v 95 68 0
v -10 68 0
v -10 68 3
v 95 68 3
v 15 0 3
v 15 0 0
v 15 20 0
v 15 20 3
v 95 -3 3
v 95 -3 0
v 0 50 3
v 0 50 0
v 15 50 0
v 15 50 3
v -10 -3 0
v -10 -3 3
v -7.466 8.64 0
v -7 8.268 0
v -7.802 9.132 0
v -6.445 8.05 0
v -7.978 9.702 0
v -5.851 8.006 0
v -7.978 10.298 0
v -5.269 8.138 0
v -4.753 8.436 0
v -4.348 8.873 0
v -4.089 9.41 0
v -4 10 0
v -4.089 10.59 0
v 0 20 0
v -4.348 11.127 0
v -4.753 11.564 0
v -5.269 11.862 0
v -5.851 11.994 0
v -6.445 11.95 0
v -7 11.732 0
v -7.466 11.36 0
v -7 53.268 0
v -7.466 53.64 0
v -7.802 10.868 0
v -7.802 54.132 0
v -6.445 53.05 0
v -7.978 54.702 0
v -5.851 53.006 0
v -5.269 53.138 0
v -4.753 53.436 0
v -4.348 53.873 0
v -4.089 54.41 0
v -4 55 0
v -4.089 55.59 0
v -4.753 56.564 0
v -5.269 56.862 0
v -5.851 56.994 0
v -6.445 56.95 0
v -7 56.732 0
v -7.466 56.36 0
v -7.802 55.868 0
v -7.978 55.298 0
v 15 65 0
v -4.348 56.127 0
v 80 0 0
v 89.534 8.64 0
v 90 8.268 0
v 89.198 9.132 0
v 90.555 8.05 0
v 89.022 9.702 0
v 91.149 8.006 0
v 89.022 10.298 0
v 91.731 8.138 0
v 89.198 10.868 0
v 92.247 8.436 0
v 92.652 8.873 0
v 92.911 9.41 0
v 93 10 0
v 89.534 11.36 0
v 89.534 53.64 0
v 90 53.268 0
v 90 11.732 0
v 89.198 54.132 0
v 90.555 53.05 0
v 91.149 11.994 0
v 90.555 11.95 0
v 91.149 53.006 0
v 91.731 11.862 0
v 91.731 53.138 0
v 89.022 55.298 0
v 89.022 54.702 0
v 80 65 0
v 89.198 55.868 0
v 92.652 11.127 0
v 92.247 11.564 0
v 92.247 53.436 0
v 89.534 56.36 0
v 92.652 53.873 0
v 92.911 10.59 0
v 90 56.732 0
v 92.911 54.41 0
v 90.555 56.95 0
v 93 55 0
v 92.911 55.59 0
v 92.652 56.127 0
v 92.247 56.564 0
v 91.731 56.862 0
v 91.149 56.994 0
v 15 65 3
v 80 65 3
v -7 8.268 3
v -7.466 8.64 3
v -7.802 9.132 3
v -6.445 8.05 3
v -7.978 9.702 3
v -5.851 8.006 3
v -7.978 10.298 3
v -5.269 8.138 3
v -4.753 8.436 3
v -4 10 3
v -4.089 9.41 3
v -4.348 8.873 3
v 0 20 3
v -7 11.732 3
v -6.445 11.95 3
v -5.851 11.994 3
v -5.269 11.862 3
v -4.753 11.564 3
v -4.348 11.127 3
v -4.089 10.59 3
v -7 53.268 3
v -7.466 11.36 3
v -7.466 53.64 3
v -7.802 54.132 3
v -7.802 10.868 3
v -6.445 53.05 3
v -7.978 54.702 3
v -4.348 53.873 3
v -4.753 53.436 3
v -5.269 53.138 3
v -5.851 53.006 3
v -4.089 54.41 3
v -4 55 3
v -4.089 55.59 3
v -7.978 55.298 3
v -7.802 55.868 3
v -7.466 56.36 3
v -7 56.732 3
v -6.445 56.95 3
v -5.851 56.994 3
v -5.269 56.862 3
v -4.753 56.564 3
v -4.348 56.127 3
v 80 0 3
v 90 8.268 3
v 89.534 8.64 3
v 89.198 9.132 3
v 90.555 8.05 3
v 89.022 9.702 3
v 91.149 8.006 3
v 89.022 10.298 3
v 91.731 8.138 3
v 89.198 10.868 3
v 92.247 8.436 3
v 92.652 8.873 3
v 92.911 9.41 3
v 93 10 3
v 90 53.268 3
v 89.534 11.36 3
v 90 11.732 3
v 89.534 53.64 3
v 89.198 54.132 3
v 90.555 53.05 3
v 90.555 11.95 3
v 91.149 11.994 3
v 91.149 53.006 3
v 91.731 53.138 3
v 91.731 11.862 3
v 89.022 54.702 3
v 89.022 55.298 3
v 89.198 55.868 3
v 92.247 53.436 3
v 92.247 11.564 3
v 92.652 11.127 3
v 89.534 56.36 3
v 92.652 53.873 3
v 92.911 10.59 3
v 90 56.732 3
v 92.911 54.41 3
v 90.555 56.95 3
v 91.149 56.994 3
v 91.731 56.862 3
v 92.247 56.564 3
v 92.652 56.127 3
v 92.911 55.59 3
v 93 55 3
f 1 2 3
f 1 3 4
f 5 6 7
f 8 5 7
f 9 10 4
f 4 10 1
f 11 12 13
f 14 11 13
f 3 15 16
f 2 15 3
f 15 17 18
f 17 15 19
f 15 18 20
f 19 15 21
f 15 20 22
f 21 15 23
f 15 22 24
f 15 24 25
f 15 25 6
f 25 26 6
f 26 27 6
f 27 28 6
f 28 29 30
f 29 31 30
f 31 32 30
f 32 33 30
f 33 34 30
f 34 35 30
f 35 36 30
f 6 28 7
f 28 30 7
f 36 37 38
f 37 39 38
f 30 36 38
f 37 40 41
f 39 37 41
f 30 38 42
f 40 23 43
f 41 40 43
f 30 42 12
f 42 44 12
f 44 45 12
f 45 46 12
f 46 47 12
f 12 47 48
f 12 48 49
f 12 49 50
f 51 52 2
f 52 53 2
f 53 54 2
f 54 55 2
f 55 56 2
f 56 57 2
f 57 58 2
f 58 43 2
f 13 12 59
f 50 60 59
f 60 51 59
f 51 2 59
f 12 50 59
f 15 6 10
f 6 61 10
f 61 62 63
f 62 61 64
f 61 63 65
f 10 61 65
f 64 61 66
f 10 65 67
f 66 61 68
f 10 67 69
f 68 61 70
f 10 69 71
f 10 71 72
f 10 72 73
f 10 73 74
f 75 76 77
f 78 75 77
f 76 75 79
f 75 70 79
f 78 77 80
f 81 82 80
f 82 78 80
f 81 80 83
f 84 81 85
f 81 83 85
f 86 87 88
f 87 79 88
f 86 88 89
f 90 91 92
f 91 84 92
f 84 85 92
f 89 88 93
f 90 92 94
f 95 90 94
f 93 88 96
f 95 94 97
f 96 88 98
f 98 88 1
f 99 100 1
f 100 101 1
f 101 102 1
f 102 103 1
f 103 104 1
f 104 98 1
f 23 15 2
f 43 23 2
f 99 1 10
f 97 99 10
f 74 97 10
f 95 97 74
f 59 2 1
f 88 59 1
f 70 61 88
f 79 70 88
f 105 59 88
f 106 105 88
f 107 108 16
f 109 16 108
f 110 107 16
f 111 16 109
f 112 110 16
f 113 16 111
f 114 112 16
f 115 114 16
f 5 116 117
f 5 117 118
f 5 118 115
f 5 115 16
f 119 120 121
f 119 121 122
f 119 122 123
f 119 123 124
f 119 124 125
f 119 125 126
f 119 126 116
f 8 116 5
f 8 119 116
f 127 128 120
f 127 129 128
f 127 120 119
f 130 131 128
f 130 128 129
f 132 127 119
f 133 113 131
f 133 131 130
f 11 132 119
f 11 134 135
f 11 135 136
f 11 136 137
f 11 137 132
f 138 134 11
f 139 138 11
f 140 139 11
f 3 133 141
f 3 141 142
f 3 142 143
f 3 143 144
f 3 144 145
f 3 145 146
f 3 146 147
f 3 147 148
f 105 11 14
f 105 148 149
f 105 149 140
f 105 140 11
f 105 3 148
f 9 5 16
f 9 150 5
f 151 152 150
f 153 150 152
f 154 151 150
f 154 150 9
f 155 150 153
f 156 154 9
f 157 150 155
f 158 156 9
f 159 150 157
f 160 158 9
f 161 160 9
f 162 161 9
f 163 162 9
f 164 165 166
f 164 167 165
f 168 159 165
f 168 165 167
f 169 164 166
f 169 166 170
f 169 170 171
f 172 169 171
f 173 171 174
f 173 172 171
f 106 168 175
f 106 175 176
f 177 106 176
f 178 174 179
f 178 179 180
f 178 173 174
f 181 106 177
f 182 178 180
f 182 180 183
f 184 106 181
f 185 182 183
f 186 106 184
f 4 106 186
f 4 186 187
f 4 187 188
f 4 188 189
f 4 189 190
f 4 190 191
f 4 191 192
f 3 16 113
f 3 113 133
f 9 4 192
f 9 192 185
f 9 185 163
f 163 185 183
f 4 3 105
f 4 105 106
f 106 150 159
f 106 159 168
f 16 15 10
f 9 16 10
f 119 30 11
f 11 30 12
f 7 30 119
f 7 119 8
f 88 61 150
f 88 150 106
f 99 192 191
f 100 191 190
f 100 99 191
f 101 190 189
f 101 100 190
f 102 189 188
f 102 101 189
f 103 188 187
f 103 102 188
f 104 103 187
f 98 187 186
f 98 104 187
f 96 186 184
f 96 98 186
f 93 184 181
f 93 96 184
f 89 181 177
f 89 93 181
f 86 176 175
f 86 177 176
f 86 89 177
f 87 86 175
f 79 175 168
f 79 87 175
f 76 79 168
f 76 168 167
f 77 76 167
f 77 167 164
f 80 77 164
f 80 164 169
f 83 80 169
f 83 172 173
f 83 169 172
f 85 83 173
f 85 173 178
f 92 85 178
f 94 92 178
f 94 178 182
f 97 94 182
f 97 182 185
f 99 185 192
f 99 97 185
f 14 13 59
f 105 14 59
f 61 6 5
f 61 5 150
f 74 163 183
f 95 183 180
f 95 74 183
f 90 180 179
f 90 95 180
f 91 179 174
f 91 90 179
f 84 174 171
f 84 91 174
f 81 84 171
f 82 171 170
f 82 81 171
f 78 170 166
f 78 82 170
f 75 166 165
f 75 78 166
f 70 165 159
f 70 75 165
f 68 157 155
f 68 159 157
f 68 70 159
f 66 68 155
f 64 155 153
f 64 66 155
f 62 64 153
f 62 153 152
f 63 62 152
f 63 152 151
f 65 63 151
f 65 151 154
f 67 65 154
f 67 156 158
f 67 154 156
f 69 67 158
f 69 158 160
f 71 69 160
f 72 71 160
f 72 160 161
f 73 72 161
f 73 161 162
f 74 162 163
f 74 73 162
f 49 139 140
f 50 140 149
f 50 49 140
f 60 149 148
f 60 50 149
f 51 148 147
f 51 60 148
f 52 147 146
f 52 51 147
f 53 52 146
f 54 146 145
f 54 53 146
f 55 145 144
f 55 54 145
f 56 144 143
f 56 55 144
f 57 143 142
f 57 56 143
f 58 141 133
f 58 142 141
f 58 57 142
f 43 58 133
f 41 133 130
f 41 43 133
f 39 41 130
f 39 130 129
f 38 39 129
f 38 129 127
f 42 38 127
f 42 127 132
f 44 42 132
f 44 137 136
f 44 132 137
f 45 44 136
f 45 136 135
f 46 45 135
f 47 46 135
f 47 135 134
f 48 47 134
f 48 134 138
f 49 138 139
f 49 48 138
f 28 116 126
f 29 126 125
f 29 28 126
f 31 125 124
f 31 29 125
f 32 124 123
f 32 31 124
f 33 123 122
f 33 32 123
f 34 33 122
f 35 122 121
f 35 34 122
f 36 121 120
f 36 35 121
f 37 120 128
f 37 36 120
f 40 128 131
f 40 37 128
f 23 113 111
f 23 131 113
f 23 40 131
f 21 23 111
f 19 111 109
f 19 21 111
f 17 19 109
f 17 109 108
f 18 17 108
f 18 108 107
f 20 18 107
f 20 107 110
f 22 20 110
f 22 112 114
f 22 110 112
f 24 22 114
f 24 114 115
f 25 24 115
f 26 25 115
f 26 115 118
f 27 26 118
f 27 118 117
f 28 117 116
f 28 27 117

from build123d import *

# Parameters (mm, degrees)
SKETCH001_W     = 105
SKETCH001_H     = 71
PAD_DEPTH       = 3
SKETCH_W        = 80
SKETCH_H        = 65
POCKET_DEPTH    = 5
SKETCH002_R     = 2
POCKET001_DEPTH = 5
SKETCH003_R     = 2
POCKET002_DEPTH = 5
SKETCH004_R     = 2
POCKET003_DEPTH = 5
SKETCH005_R     = 2
POCKET004_DEPTH = 5
SKETCH006_W     = 15
SKETCH006_H     = 65
PAD001_DEPTH    = 3
SKETCH007_W     = 15
SKETCH007_H     = 30
POCKET005_DEPTH = 3


with BuildPart() as part:
    # Sketch001 → Pad (new body)
    with BuildSketch(Plane.XY):
        with Locations((42.5, 32.5)):
            Rectangle(SKETCH001_W, SKETCH001_H)
    extrude(amount=PAD_DEPTH)

    # Sketch → Pocket (cut)
    with BuildSketch(Plane.XY):
        with Locations((40, 32.5)):
            Rectangle(SKETCH_W, SKETCH_H)
    extrude(amount=POCKET_DEPTH, mode=Mode.SUBTRACT)

    # Sketch002 → Pocket001 (cut)
    with BuildSketch(Plane.XY):
        with Locations((-6, 10)):
            Circle(SKETCH002_R)
    extrude(amount=POCKET001_DEPTH, mode=Mode.SUBTRACT)

    # Sketch003 → Pocket002 (cut)
    with BuildSketch(Plane.XY):
        with Locations((-6, 55)):
            Circle(SKETCH003_R)
    extrude(amount=POCKET002_DEPTH, mode=Mode.SUBTRACT)

    # Sketch004 → Pocket003 (cut)
    with BuildSketch(Plane.XY):
        with Locations((91, 10)):
            Circle(SKETCH004_R)
    extrude(amount=POCKET003_DEPTH, mode=Mode.SUBTRACT)

    # Sketch005 → Pocket004 (cut)
    with BuildSketch(Plane.XY):
        with Locations((91, 55)):
            Circle(SKETCH005_R)
    extrude(amount=POCKET004_DEPTH, mode=Mode.SUBTRACT)

    # Sketch006 → Pad001 (join)
    with BuildSketch(Plane.XY):
        with Locations((7.5, 32.5)):
            Rectangle(SKETCH006_W, SKETCH006_H)
    extrude(amount=PAD001_DEPTH)

    # Sketch007 → Pocket005 (cut)
    with BuildSketch(Plane.XY):
        with Locations((7.5, 35)):
            Rectangle(SKETCH007_W, SKETCH007_H)
    extrude(amount=POCKET005_DEPTH, mode=Mode.SUBTRACT)


solid = part.part
